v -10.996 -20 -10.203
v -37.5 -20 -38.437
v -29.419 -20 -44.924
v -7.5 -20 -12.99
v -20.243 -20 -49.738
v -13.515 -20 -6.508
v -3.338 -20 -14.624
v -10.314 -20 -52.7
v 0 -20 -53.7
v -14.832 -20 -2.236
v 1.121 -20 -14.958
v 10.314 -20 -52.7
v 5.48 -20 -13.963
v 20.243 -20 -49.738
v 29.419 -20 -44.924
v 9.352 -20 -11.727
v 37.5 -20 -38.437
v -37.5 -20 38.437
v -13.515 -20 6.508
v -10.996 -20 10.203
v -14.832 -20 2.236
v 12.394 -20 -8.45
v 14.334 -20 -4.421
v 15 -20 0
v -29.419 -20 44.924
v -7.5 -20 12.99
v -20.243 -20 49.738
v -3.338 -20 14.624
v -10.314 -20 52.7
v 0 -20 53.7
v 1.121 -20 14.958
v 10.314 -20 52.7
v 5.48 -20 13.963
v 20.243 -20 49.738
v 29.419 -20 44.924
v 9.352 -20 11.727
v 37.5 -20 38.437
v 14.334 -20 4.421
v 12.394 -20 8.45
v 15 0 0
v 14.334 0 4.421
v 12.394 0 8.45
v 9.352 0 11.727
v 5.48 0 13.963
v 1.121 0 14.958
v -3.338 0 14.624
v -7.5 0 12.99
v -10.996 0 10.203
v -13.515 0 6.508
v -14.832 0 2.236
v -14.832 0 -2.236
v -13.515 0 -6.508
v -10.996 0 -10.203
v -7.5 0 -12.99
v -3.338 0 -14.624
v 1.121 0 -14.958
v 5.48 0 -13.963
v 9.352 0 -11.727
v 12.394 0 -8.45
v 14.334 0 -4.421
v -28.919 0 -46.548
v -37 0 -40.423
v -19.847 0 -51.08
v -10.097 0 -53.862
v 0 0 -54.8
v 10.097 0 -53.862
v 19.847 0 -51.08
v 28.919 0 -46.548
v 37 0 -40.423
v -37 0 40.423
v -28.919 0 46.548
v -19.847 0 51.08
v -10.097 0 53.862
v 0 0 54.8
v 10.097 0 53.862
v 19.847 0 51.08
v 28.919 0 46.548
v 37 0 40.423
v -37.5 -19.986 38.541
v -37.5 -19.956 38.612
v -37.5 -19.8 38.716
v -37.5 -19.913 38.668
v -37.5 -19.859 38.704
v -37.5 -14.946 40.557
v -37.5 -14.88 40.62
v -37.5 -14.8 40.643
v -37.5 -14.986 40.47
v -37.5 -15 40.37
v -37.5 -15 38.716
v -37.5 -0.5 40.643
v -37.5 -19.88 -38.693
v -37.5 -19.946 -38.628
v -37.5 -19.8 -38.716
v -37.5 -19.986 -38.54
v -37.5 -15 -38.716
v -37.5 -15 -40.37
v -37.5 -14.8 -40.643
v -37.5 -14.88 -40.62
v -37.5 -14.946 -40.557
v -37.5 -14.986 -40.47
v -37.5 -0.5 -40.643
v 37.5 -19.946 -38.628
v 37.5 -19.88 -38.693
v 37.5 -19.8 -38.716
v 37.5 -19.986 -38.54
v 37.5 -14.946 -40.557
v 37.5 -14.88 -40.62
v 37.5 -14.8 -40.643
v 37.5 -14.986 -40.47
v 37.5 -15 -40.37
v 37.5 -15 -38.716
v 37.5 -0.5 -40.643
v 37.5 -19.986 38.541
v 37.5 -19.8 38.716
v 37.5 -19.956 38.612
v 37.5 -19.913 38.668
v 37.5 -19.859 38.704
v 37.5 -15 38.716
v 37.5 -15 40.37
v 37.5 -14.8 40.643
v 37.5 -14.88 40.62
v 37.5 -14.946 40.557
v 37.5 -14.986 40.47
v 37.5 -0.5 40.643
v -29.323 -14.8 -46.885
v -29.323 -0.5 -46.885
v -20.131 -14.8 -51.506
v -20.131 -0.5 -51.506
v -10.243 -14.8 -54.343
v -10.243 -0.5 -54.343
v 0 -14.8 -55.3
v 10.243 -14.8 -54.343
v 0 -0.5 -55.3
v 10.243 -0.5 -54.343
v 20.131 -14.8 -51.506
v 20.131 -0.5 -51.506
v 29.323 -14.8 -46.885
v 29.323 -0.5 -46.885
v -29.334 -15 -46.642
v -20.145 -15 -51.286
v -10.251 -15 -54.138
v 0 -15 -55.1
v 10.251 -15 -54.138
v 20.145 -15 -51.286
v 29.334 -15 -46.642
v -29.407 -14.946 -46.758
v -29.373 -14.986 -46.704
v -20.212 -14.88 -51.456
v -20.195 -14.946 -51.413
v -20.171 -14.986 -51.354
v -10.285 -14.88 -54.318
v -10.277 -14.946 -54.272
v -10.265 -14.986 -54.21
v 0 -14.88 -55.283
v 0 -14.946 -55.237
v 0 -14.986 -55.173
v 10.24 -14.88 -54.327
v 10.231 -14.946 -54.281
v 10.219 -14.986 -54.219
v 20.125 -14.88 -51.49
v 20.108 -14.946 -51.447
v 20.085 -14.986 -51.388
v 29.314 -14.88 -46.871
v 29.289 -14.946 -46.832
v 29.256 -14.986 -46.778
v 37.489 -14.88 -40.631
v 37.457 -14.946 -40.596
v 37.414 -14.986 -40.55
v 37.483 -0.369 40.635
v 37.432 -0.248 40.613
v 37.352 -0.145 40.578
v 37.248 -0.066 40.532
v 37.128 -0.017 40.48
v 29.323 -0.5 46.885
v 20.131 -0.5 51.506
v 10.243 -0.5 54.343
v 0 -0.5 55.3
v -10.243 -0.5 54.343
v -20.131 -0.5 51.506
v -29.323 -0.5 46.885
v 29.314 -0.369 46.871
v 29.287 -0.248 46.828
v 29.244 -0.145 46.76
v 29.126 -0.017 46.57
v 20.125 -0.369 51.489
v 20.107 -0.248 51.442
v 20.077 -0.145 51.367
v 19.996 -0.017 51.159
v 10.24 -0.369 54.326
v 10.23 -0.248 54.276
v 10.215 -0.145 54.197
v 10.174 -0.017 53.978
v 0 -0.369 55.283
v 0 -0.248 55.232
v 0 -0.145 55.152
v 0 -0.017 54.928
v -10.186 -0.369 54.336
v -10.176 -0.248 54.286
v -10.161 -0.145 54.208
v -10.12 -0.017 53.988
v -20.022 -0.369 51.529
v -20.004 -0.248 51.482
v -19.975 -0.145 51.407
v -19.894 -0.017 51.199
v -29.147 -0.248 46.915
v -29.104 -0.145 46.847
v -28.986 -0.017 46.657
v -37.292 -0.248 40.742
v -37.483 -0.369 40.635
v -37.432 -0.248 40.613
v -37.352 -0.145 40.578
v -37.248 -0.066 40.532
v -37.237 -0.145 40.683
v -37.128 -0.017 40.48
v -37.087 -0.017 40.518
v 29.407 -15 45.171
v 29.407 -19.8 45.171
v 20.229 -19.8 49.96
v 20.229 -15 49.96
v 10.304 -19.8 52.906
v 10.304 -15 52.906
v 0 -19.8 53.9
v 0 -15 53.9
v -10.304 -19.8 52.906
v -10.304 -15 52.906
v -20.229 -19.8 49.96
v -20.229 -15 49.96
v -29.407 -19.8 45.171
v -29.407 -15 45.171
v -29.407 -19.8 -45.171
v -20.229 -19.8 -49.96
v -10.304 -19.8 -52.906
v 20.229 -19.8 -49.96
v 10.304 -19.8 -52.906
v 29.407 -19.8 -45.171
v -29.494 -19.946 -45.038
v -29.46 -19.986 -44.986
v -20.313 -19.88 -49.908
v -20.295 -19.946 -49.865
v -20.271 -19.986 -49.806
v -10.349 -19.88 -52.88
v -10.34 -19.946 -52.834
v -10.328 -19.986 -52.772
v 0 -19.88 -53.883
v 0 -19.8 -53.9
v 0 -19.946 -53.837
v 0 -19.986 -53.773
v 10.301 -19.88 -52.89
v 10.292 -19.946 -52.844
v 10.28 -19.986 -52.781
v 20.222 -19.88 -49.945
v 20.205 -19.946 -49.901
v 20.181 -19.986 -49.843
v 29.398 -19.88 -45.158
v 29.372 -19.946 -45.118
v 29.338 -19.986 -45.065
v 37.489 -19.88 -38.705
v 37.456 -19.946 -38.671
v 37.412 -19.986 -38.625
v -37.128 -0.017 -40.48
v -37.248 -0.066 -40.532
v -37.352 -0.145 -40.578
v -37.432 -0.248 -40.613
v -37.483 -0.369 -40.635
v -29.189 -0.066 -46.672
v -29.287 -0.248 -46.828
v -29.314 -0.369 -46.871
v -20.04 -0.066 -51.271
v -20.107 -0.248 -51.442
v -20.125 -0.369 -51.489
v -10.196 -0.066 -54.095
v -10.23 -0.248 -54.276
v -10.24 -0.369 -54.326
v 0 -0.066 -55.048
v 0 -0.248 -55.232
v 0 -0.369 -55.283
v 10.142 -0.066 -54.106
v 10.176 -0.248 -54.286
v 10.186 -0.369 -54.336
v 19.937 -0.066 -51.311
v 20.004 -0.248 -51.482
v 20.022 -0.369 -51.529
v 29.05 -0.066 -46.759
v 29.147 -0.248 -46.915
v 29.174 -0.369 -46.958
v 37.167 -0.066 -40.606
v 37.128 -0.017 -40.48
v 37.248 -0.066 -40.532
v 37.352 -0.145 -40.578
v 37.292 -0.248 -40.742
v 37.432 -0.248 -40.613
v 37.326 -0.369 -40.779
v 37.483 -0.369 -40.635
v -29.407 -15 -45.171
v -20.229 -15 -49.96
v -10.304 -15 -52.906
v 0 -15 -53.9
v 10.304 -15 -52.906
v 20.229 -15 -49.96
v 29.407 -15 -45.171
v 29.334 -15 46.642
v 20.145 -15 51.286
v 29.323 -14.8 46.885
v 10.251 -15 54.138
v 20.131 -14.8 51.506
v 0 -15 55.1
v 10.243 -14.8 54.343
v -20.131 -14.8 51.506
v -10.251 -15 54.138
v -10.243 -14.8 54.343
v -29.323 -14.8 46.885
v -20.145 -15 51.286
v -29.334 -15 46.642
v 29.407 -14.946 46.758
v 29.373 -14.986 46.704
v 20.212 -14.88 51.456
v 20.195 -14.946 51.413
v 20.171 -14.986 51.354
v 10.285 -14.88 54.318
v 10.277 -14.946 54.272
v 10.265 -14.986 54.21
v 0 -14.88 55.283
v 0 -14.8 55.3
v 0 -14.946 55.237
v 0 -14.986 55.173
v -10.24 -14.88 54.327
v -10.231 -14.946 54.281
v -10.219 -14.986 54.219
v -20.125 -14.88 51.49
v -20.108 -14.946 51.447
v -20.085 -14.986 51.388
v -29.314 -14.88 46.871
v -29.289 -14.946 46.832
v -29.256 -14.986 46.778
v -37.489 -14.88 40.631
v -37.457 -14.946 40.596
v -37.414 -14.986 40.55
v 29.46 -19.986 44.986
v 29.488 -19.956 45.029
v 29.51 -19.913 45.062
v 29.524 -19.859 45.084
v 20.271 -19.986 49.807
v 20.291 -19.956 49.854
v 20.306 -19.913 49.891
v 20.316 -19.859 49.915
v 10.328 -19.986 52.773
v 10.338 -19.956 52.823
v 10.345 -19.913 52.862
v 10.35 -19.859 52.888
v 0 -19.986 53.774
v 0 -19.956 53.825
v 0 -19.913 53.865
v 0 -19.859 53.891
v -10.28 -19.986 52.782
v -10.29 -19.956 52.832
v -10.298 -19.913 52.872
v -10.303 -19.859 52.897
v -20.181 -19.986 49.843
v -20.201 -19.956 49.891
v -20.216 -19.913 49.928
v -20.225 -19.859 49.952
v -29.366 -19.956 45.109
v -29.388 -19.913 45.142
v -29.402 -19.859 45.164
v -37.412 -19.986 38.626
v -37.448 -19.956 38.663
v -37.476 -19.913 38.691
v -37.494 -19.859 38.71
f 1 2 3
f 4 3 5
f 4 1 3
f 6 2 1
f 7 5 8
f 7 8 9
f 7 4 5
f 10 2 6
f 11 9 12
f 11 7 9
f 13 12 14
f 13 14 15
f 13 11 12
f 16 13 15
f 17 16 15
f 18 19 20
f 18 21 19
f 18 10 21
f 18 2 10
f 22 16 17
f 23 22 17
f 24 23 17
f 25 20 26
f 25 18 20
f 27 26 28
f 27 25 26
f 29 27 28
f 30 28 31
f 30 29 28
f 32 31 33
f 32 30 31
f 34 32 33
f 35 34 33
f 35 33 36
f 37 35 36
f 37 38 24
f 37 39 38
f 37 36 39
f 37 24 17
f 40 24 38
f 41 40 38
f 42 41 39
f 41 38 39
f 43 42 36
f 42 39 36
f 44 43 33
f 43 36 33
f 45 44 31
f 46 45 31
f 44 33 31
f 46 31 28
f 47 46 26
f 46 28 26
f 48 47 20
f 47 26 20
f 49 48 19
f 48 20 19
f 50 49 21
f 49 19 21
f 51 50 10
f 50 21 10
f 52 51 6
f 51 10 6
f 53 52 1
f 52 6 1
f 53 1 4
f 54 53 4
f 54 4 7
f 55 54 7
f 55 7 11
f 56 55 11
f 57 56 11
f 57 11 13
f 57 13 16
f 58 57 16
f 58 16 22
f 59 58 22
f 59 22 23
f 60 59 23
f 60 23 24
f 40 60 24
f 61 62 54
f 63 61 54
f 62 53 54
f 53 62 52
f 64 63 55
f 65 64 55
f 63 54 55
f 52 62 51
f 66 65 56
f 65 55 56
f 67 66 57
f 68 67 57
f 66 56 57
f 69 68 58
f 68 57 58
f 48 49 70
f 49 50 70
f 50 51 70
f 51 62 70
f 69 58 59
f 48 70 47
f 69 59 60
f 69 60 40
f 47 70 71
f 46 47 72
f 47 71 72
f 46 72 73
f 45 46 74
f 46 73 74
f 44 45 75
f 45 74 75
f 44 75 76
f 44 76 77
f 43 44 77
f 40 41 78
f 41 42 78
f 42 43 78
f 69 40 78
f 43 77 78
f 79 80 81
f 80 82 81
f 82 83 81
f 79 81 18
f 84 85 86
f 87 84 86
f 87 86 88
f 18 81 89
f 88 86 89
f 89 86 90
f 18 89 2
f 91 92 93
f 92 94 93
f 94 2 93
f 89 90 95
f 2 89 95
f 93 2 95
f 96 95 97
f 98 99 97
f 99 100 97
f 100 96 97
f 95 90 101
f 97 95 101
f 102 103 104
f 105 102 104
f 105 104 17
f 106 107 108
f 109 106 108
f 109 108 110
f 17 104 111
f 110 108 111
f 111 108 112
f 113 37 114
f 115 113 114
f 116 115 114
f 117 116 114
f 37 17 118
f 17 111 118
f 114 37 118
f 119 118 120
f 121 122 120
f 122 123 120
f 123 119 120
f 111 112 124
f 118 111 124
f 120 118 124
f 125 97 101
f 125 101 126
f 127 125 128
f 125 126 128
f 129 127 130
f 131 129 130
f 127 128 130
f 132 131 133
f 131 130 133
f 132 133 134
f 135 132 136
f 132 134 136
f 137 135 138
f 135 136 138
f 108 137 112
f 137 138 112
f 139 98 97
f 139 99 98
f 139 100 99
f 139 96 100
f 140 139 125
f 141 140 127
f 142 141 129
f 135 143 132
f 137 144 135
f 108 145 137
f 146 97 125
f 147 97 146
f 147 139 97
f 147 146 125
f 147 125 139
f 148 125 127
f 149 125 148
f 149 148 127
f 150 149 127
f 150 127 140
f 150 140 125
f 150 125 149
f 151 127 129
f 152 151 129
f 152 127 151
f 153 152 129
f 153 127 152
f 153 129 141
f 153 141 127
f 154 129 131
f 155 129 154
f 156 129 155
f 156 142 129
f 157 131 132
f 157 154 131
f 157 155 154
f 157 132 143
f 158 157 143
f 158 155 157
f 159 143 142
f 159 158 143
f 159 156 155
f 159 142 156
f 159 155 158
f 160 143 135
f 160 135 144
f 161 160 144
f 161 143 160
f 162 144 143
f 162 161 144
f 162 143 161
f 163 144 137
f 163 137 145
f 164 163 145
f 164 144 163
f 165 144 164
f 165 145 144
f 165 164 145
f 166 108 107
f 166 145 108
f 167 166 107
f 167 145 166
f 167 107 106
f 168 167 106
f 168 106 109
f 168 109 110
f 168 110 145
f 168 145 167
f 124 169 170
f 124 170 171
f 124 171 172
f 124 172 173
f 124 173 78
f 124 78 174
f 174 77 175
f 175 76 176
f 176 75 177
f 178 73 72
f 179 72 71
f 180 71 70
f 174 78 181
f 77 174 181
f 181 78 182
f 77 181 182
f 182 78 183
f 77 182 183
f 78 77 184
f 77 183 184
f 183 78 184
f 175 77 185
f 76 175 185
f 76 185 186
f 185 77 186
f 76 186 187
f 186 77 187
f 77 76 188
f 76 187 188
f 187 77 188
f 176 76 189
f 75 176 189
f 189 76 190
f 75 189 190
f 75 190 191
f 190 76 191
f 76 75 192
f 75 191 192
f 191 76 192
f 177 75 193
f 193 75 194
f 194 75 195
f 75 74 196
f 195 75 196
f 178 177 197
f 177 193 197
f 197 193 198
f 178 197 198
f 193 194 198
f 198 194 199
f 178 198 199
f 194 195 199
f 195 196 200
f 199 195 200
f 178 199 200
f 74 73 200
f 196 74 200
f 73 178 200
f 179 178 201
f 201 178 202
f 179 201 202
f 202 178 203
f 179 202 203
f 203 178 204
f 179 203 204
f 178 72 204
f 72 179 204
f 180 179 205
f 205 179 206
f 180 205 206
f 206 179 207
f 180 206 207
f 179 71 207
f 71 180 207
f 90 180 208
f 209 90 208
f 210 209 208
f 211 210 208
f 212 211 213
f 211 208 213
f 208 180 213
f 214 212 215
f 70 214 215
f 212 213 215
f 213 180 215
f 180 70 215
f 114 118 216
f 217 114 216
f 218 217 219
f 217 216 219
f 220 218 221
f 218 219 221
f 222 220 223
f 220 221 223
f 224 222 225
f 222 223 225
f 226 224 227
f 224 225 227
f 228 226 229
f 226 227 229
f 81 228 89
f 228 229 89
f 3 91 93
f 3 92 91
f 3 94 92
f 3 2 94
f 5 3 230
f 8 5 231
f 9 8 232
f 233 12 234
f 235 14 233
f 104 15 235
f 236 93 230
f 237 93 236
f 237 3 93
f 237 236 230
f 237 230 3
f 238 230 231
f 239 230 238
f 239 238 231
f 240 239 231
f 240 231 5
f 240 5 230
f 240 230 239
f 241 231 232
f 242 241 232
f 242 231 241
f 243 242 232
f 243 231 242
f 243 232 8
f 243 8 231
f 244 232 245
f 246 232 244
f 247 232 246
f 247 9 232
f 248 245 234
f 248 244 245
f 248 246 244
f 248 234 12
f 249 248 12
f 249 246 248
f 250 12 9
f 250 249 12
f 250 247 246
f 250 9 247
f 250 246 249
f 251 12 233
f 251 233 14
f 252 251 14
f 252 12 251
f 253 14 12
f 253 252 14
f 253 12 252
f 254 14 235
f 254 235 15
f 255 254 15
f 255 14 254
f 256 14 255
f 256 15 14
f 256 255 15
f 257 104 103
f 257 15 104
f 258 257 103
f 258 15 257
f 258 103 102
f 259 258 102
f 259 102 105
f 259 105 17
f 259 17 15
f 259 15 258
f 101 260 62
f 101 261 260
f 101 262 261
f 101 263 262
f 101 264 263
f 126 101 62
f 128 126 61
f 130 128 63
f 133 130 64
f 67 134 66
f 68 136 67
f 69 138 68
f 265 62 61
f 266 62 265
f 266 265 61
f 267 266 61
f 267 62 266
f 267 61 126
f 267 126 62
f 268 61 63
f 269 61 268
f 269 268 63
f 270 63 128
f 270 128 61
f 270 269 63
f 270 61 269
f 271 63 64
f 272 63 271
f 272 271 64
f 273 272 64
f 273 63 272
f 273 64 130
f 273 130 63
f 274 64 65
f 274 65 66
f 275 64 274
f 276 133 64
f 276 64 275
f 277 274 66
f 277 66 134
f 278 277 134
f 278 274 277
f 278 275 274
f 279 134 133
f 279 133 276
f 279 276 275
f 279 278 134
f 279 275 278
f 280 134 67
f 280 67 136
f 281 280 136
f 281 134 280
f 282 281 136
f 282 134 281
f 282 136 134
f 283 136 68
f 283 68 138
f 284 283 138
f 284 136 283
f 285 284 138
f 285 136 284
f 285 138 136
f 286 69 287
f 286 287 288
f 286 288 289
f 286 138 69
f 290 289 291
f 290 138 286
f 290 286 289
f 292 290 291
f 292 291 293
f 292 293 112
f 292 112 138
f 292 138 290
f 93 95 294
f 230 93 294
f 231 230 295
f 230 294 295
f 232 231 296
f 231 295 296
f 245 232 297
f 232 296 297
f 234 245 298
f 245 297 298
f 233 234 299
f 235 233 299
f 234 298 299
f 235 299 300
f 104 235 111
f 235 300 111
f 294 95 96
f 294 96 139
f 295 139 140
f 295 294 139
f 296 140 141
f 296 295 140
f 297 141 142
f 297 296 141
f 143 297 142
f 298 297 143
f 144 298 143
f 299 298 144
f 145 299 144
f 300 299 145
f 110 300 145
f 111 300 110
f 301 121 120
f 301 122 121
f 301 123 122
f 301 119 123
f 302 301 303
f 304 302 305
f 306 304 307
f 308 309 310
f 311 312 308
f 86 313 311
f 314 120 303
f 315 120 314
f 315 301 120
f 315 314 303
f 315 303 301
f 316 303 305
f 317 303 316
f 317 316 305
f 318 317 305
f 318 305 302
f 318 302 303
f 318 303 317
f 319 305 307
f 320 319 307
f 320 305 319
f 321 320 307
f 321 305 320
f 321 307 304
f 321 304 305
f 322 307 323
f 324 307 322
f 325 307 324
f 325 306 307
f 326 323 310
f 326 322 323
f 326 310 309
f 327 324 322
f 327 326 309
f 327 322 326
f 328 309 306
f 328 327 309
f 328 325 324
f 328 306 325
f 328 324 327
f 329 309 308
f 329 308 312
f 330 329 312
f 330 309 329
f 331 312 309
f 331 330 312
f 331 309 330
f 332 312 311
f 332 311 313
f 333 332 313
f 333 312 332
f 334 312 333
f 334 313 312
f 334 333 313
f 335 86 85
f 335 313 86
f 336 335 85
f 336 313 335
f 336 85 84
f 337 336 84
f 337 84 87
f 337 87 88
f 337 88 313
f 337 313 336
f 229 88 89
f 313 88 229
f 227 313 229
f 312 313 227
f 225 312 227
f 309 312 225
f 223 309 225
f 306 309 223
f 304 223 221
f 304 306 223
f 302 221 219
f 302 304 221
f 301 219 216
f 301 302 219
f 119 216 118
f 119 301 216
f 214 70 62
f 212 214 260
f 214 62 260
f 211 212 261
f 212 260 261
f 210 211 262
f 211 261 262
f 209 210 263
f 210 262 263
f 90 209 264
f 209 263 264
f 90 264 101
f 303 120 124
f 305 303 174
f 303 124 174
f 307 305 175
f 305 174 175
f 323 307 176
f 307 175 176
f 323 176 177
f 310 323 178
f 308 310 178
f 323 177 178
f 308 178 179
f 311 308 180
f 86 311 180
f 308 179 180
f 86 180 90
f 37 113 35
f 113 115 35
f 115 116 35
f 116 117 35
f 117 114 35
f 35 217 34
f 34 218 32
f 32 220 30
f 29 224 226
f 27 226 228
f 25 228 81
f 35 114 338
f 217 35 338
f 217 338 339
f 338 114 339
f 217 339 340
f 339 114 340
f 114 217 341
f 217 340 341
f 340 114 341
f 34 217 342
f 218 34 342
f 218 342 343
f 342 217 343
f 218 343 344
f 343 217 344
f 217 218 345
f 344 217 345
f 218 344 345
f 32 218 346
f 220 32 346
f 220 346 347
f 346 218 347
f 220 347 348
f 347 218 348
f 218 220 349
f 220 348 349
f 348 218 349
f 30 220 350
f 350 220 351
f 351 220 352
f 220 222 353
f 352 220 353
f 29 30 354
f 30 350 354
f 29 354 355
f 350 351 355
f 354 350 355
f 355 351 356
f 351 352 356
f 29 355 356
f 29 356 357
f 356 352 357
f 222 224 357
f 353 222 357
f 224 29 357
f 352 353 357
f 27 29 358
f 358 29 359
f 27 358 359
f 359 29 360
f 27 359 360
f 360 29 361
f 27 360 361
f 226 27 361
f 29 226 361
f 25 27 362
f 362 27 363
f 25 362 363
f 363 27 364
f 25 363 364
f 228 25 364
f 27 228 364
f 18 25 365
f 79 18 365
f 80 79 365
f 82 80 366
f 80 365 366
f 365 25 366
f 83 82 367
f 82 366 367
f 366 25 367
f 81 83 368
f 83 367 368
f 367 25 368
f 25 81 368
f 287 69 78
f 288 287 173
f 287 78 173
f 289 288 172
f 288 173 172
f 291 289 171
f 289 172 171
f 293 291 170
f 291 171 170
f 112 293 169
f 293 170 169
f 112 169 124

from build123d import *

# Parameters (mm, degrees)
F0_R     = 55.3
F1_DEPTH = 15
F2_R     = 53.9
F3_DEPTH = 5
F4_R     = 15
F5_DEPTH = 25
F7_DEPTH = 25
F8_R     = 0.5
F9_R     = 0.2


with BuildPart() as f1:
    # F0 (on Front) → F1 (new body)
    with BuildSketch(Plane.XZ):
        Circle(F0_R)
    extrude(amount=F1_DEPTH)

    # F2 (on face) → F3 (join)
    with BuildSketch(Plane.XZ.offset(15)):
        Circle(F2_R)
    extrude(amount=F3_DEPTH)

    # F4 (on face) → F5 (cut)
    with BuildSketch(Plane.XZ.offset(20)):
        Circle(F4_R)
    extrude(amount=-F5_DEPTH, mode=Mode.SUBTRACT)

    # F6 (on face) → F7 (cut)
    with BuildSketch(Plane(origin=(0, 0, 0), x_dir=(-1, 0, 0), z_dir=(0, 1, 0))):
        with BuildLine():
            Line((37.5, 40.6428345468), (37.5, -40.6428345468))
            ThreePointArc((37.5, -40.6428345468), (50.6549109169, -22.1849047778), (55.3, 0))
            ThreePointArc((55.3, 0), (50.6549109169, 22.1849047778), (37.5, 40.6428345468))
        make_face()
        with BuildLine():
            ThreePointArc((-37.5, 40.6428345468), (-55.3, 0), (-37.5, -40.6428345468))
            Line((-37.5, -40.6428345468), (-37.5, 40.6428345468))
        make_face()
    extrude(amount=-F7_DEPTH, mode=Mode.SUBTRACT)

    # F8
    f8_edges = [f1.edges().sort_by_distance(p)[0] for p in [
        (37.5, 0, 0),
        (0, 0, 55.3),
        (0, 0, -55.3),
        (-37.5, 0, 0),
    ]]
    fillet(f8_edges, radius=F8_R)

    # F9
    f9_edges = [f1.edges().sort_by_distance(p)[0] for p in [
        (0, -20, -53.9),
        (0, -20, 53.9),
        (0, -15, 55.3),
        (0, -15, -55.3),
    ]]
    fillet(f9_edges, radius=F9_R)


solid = f1.part
